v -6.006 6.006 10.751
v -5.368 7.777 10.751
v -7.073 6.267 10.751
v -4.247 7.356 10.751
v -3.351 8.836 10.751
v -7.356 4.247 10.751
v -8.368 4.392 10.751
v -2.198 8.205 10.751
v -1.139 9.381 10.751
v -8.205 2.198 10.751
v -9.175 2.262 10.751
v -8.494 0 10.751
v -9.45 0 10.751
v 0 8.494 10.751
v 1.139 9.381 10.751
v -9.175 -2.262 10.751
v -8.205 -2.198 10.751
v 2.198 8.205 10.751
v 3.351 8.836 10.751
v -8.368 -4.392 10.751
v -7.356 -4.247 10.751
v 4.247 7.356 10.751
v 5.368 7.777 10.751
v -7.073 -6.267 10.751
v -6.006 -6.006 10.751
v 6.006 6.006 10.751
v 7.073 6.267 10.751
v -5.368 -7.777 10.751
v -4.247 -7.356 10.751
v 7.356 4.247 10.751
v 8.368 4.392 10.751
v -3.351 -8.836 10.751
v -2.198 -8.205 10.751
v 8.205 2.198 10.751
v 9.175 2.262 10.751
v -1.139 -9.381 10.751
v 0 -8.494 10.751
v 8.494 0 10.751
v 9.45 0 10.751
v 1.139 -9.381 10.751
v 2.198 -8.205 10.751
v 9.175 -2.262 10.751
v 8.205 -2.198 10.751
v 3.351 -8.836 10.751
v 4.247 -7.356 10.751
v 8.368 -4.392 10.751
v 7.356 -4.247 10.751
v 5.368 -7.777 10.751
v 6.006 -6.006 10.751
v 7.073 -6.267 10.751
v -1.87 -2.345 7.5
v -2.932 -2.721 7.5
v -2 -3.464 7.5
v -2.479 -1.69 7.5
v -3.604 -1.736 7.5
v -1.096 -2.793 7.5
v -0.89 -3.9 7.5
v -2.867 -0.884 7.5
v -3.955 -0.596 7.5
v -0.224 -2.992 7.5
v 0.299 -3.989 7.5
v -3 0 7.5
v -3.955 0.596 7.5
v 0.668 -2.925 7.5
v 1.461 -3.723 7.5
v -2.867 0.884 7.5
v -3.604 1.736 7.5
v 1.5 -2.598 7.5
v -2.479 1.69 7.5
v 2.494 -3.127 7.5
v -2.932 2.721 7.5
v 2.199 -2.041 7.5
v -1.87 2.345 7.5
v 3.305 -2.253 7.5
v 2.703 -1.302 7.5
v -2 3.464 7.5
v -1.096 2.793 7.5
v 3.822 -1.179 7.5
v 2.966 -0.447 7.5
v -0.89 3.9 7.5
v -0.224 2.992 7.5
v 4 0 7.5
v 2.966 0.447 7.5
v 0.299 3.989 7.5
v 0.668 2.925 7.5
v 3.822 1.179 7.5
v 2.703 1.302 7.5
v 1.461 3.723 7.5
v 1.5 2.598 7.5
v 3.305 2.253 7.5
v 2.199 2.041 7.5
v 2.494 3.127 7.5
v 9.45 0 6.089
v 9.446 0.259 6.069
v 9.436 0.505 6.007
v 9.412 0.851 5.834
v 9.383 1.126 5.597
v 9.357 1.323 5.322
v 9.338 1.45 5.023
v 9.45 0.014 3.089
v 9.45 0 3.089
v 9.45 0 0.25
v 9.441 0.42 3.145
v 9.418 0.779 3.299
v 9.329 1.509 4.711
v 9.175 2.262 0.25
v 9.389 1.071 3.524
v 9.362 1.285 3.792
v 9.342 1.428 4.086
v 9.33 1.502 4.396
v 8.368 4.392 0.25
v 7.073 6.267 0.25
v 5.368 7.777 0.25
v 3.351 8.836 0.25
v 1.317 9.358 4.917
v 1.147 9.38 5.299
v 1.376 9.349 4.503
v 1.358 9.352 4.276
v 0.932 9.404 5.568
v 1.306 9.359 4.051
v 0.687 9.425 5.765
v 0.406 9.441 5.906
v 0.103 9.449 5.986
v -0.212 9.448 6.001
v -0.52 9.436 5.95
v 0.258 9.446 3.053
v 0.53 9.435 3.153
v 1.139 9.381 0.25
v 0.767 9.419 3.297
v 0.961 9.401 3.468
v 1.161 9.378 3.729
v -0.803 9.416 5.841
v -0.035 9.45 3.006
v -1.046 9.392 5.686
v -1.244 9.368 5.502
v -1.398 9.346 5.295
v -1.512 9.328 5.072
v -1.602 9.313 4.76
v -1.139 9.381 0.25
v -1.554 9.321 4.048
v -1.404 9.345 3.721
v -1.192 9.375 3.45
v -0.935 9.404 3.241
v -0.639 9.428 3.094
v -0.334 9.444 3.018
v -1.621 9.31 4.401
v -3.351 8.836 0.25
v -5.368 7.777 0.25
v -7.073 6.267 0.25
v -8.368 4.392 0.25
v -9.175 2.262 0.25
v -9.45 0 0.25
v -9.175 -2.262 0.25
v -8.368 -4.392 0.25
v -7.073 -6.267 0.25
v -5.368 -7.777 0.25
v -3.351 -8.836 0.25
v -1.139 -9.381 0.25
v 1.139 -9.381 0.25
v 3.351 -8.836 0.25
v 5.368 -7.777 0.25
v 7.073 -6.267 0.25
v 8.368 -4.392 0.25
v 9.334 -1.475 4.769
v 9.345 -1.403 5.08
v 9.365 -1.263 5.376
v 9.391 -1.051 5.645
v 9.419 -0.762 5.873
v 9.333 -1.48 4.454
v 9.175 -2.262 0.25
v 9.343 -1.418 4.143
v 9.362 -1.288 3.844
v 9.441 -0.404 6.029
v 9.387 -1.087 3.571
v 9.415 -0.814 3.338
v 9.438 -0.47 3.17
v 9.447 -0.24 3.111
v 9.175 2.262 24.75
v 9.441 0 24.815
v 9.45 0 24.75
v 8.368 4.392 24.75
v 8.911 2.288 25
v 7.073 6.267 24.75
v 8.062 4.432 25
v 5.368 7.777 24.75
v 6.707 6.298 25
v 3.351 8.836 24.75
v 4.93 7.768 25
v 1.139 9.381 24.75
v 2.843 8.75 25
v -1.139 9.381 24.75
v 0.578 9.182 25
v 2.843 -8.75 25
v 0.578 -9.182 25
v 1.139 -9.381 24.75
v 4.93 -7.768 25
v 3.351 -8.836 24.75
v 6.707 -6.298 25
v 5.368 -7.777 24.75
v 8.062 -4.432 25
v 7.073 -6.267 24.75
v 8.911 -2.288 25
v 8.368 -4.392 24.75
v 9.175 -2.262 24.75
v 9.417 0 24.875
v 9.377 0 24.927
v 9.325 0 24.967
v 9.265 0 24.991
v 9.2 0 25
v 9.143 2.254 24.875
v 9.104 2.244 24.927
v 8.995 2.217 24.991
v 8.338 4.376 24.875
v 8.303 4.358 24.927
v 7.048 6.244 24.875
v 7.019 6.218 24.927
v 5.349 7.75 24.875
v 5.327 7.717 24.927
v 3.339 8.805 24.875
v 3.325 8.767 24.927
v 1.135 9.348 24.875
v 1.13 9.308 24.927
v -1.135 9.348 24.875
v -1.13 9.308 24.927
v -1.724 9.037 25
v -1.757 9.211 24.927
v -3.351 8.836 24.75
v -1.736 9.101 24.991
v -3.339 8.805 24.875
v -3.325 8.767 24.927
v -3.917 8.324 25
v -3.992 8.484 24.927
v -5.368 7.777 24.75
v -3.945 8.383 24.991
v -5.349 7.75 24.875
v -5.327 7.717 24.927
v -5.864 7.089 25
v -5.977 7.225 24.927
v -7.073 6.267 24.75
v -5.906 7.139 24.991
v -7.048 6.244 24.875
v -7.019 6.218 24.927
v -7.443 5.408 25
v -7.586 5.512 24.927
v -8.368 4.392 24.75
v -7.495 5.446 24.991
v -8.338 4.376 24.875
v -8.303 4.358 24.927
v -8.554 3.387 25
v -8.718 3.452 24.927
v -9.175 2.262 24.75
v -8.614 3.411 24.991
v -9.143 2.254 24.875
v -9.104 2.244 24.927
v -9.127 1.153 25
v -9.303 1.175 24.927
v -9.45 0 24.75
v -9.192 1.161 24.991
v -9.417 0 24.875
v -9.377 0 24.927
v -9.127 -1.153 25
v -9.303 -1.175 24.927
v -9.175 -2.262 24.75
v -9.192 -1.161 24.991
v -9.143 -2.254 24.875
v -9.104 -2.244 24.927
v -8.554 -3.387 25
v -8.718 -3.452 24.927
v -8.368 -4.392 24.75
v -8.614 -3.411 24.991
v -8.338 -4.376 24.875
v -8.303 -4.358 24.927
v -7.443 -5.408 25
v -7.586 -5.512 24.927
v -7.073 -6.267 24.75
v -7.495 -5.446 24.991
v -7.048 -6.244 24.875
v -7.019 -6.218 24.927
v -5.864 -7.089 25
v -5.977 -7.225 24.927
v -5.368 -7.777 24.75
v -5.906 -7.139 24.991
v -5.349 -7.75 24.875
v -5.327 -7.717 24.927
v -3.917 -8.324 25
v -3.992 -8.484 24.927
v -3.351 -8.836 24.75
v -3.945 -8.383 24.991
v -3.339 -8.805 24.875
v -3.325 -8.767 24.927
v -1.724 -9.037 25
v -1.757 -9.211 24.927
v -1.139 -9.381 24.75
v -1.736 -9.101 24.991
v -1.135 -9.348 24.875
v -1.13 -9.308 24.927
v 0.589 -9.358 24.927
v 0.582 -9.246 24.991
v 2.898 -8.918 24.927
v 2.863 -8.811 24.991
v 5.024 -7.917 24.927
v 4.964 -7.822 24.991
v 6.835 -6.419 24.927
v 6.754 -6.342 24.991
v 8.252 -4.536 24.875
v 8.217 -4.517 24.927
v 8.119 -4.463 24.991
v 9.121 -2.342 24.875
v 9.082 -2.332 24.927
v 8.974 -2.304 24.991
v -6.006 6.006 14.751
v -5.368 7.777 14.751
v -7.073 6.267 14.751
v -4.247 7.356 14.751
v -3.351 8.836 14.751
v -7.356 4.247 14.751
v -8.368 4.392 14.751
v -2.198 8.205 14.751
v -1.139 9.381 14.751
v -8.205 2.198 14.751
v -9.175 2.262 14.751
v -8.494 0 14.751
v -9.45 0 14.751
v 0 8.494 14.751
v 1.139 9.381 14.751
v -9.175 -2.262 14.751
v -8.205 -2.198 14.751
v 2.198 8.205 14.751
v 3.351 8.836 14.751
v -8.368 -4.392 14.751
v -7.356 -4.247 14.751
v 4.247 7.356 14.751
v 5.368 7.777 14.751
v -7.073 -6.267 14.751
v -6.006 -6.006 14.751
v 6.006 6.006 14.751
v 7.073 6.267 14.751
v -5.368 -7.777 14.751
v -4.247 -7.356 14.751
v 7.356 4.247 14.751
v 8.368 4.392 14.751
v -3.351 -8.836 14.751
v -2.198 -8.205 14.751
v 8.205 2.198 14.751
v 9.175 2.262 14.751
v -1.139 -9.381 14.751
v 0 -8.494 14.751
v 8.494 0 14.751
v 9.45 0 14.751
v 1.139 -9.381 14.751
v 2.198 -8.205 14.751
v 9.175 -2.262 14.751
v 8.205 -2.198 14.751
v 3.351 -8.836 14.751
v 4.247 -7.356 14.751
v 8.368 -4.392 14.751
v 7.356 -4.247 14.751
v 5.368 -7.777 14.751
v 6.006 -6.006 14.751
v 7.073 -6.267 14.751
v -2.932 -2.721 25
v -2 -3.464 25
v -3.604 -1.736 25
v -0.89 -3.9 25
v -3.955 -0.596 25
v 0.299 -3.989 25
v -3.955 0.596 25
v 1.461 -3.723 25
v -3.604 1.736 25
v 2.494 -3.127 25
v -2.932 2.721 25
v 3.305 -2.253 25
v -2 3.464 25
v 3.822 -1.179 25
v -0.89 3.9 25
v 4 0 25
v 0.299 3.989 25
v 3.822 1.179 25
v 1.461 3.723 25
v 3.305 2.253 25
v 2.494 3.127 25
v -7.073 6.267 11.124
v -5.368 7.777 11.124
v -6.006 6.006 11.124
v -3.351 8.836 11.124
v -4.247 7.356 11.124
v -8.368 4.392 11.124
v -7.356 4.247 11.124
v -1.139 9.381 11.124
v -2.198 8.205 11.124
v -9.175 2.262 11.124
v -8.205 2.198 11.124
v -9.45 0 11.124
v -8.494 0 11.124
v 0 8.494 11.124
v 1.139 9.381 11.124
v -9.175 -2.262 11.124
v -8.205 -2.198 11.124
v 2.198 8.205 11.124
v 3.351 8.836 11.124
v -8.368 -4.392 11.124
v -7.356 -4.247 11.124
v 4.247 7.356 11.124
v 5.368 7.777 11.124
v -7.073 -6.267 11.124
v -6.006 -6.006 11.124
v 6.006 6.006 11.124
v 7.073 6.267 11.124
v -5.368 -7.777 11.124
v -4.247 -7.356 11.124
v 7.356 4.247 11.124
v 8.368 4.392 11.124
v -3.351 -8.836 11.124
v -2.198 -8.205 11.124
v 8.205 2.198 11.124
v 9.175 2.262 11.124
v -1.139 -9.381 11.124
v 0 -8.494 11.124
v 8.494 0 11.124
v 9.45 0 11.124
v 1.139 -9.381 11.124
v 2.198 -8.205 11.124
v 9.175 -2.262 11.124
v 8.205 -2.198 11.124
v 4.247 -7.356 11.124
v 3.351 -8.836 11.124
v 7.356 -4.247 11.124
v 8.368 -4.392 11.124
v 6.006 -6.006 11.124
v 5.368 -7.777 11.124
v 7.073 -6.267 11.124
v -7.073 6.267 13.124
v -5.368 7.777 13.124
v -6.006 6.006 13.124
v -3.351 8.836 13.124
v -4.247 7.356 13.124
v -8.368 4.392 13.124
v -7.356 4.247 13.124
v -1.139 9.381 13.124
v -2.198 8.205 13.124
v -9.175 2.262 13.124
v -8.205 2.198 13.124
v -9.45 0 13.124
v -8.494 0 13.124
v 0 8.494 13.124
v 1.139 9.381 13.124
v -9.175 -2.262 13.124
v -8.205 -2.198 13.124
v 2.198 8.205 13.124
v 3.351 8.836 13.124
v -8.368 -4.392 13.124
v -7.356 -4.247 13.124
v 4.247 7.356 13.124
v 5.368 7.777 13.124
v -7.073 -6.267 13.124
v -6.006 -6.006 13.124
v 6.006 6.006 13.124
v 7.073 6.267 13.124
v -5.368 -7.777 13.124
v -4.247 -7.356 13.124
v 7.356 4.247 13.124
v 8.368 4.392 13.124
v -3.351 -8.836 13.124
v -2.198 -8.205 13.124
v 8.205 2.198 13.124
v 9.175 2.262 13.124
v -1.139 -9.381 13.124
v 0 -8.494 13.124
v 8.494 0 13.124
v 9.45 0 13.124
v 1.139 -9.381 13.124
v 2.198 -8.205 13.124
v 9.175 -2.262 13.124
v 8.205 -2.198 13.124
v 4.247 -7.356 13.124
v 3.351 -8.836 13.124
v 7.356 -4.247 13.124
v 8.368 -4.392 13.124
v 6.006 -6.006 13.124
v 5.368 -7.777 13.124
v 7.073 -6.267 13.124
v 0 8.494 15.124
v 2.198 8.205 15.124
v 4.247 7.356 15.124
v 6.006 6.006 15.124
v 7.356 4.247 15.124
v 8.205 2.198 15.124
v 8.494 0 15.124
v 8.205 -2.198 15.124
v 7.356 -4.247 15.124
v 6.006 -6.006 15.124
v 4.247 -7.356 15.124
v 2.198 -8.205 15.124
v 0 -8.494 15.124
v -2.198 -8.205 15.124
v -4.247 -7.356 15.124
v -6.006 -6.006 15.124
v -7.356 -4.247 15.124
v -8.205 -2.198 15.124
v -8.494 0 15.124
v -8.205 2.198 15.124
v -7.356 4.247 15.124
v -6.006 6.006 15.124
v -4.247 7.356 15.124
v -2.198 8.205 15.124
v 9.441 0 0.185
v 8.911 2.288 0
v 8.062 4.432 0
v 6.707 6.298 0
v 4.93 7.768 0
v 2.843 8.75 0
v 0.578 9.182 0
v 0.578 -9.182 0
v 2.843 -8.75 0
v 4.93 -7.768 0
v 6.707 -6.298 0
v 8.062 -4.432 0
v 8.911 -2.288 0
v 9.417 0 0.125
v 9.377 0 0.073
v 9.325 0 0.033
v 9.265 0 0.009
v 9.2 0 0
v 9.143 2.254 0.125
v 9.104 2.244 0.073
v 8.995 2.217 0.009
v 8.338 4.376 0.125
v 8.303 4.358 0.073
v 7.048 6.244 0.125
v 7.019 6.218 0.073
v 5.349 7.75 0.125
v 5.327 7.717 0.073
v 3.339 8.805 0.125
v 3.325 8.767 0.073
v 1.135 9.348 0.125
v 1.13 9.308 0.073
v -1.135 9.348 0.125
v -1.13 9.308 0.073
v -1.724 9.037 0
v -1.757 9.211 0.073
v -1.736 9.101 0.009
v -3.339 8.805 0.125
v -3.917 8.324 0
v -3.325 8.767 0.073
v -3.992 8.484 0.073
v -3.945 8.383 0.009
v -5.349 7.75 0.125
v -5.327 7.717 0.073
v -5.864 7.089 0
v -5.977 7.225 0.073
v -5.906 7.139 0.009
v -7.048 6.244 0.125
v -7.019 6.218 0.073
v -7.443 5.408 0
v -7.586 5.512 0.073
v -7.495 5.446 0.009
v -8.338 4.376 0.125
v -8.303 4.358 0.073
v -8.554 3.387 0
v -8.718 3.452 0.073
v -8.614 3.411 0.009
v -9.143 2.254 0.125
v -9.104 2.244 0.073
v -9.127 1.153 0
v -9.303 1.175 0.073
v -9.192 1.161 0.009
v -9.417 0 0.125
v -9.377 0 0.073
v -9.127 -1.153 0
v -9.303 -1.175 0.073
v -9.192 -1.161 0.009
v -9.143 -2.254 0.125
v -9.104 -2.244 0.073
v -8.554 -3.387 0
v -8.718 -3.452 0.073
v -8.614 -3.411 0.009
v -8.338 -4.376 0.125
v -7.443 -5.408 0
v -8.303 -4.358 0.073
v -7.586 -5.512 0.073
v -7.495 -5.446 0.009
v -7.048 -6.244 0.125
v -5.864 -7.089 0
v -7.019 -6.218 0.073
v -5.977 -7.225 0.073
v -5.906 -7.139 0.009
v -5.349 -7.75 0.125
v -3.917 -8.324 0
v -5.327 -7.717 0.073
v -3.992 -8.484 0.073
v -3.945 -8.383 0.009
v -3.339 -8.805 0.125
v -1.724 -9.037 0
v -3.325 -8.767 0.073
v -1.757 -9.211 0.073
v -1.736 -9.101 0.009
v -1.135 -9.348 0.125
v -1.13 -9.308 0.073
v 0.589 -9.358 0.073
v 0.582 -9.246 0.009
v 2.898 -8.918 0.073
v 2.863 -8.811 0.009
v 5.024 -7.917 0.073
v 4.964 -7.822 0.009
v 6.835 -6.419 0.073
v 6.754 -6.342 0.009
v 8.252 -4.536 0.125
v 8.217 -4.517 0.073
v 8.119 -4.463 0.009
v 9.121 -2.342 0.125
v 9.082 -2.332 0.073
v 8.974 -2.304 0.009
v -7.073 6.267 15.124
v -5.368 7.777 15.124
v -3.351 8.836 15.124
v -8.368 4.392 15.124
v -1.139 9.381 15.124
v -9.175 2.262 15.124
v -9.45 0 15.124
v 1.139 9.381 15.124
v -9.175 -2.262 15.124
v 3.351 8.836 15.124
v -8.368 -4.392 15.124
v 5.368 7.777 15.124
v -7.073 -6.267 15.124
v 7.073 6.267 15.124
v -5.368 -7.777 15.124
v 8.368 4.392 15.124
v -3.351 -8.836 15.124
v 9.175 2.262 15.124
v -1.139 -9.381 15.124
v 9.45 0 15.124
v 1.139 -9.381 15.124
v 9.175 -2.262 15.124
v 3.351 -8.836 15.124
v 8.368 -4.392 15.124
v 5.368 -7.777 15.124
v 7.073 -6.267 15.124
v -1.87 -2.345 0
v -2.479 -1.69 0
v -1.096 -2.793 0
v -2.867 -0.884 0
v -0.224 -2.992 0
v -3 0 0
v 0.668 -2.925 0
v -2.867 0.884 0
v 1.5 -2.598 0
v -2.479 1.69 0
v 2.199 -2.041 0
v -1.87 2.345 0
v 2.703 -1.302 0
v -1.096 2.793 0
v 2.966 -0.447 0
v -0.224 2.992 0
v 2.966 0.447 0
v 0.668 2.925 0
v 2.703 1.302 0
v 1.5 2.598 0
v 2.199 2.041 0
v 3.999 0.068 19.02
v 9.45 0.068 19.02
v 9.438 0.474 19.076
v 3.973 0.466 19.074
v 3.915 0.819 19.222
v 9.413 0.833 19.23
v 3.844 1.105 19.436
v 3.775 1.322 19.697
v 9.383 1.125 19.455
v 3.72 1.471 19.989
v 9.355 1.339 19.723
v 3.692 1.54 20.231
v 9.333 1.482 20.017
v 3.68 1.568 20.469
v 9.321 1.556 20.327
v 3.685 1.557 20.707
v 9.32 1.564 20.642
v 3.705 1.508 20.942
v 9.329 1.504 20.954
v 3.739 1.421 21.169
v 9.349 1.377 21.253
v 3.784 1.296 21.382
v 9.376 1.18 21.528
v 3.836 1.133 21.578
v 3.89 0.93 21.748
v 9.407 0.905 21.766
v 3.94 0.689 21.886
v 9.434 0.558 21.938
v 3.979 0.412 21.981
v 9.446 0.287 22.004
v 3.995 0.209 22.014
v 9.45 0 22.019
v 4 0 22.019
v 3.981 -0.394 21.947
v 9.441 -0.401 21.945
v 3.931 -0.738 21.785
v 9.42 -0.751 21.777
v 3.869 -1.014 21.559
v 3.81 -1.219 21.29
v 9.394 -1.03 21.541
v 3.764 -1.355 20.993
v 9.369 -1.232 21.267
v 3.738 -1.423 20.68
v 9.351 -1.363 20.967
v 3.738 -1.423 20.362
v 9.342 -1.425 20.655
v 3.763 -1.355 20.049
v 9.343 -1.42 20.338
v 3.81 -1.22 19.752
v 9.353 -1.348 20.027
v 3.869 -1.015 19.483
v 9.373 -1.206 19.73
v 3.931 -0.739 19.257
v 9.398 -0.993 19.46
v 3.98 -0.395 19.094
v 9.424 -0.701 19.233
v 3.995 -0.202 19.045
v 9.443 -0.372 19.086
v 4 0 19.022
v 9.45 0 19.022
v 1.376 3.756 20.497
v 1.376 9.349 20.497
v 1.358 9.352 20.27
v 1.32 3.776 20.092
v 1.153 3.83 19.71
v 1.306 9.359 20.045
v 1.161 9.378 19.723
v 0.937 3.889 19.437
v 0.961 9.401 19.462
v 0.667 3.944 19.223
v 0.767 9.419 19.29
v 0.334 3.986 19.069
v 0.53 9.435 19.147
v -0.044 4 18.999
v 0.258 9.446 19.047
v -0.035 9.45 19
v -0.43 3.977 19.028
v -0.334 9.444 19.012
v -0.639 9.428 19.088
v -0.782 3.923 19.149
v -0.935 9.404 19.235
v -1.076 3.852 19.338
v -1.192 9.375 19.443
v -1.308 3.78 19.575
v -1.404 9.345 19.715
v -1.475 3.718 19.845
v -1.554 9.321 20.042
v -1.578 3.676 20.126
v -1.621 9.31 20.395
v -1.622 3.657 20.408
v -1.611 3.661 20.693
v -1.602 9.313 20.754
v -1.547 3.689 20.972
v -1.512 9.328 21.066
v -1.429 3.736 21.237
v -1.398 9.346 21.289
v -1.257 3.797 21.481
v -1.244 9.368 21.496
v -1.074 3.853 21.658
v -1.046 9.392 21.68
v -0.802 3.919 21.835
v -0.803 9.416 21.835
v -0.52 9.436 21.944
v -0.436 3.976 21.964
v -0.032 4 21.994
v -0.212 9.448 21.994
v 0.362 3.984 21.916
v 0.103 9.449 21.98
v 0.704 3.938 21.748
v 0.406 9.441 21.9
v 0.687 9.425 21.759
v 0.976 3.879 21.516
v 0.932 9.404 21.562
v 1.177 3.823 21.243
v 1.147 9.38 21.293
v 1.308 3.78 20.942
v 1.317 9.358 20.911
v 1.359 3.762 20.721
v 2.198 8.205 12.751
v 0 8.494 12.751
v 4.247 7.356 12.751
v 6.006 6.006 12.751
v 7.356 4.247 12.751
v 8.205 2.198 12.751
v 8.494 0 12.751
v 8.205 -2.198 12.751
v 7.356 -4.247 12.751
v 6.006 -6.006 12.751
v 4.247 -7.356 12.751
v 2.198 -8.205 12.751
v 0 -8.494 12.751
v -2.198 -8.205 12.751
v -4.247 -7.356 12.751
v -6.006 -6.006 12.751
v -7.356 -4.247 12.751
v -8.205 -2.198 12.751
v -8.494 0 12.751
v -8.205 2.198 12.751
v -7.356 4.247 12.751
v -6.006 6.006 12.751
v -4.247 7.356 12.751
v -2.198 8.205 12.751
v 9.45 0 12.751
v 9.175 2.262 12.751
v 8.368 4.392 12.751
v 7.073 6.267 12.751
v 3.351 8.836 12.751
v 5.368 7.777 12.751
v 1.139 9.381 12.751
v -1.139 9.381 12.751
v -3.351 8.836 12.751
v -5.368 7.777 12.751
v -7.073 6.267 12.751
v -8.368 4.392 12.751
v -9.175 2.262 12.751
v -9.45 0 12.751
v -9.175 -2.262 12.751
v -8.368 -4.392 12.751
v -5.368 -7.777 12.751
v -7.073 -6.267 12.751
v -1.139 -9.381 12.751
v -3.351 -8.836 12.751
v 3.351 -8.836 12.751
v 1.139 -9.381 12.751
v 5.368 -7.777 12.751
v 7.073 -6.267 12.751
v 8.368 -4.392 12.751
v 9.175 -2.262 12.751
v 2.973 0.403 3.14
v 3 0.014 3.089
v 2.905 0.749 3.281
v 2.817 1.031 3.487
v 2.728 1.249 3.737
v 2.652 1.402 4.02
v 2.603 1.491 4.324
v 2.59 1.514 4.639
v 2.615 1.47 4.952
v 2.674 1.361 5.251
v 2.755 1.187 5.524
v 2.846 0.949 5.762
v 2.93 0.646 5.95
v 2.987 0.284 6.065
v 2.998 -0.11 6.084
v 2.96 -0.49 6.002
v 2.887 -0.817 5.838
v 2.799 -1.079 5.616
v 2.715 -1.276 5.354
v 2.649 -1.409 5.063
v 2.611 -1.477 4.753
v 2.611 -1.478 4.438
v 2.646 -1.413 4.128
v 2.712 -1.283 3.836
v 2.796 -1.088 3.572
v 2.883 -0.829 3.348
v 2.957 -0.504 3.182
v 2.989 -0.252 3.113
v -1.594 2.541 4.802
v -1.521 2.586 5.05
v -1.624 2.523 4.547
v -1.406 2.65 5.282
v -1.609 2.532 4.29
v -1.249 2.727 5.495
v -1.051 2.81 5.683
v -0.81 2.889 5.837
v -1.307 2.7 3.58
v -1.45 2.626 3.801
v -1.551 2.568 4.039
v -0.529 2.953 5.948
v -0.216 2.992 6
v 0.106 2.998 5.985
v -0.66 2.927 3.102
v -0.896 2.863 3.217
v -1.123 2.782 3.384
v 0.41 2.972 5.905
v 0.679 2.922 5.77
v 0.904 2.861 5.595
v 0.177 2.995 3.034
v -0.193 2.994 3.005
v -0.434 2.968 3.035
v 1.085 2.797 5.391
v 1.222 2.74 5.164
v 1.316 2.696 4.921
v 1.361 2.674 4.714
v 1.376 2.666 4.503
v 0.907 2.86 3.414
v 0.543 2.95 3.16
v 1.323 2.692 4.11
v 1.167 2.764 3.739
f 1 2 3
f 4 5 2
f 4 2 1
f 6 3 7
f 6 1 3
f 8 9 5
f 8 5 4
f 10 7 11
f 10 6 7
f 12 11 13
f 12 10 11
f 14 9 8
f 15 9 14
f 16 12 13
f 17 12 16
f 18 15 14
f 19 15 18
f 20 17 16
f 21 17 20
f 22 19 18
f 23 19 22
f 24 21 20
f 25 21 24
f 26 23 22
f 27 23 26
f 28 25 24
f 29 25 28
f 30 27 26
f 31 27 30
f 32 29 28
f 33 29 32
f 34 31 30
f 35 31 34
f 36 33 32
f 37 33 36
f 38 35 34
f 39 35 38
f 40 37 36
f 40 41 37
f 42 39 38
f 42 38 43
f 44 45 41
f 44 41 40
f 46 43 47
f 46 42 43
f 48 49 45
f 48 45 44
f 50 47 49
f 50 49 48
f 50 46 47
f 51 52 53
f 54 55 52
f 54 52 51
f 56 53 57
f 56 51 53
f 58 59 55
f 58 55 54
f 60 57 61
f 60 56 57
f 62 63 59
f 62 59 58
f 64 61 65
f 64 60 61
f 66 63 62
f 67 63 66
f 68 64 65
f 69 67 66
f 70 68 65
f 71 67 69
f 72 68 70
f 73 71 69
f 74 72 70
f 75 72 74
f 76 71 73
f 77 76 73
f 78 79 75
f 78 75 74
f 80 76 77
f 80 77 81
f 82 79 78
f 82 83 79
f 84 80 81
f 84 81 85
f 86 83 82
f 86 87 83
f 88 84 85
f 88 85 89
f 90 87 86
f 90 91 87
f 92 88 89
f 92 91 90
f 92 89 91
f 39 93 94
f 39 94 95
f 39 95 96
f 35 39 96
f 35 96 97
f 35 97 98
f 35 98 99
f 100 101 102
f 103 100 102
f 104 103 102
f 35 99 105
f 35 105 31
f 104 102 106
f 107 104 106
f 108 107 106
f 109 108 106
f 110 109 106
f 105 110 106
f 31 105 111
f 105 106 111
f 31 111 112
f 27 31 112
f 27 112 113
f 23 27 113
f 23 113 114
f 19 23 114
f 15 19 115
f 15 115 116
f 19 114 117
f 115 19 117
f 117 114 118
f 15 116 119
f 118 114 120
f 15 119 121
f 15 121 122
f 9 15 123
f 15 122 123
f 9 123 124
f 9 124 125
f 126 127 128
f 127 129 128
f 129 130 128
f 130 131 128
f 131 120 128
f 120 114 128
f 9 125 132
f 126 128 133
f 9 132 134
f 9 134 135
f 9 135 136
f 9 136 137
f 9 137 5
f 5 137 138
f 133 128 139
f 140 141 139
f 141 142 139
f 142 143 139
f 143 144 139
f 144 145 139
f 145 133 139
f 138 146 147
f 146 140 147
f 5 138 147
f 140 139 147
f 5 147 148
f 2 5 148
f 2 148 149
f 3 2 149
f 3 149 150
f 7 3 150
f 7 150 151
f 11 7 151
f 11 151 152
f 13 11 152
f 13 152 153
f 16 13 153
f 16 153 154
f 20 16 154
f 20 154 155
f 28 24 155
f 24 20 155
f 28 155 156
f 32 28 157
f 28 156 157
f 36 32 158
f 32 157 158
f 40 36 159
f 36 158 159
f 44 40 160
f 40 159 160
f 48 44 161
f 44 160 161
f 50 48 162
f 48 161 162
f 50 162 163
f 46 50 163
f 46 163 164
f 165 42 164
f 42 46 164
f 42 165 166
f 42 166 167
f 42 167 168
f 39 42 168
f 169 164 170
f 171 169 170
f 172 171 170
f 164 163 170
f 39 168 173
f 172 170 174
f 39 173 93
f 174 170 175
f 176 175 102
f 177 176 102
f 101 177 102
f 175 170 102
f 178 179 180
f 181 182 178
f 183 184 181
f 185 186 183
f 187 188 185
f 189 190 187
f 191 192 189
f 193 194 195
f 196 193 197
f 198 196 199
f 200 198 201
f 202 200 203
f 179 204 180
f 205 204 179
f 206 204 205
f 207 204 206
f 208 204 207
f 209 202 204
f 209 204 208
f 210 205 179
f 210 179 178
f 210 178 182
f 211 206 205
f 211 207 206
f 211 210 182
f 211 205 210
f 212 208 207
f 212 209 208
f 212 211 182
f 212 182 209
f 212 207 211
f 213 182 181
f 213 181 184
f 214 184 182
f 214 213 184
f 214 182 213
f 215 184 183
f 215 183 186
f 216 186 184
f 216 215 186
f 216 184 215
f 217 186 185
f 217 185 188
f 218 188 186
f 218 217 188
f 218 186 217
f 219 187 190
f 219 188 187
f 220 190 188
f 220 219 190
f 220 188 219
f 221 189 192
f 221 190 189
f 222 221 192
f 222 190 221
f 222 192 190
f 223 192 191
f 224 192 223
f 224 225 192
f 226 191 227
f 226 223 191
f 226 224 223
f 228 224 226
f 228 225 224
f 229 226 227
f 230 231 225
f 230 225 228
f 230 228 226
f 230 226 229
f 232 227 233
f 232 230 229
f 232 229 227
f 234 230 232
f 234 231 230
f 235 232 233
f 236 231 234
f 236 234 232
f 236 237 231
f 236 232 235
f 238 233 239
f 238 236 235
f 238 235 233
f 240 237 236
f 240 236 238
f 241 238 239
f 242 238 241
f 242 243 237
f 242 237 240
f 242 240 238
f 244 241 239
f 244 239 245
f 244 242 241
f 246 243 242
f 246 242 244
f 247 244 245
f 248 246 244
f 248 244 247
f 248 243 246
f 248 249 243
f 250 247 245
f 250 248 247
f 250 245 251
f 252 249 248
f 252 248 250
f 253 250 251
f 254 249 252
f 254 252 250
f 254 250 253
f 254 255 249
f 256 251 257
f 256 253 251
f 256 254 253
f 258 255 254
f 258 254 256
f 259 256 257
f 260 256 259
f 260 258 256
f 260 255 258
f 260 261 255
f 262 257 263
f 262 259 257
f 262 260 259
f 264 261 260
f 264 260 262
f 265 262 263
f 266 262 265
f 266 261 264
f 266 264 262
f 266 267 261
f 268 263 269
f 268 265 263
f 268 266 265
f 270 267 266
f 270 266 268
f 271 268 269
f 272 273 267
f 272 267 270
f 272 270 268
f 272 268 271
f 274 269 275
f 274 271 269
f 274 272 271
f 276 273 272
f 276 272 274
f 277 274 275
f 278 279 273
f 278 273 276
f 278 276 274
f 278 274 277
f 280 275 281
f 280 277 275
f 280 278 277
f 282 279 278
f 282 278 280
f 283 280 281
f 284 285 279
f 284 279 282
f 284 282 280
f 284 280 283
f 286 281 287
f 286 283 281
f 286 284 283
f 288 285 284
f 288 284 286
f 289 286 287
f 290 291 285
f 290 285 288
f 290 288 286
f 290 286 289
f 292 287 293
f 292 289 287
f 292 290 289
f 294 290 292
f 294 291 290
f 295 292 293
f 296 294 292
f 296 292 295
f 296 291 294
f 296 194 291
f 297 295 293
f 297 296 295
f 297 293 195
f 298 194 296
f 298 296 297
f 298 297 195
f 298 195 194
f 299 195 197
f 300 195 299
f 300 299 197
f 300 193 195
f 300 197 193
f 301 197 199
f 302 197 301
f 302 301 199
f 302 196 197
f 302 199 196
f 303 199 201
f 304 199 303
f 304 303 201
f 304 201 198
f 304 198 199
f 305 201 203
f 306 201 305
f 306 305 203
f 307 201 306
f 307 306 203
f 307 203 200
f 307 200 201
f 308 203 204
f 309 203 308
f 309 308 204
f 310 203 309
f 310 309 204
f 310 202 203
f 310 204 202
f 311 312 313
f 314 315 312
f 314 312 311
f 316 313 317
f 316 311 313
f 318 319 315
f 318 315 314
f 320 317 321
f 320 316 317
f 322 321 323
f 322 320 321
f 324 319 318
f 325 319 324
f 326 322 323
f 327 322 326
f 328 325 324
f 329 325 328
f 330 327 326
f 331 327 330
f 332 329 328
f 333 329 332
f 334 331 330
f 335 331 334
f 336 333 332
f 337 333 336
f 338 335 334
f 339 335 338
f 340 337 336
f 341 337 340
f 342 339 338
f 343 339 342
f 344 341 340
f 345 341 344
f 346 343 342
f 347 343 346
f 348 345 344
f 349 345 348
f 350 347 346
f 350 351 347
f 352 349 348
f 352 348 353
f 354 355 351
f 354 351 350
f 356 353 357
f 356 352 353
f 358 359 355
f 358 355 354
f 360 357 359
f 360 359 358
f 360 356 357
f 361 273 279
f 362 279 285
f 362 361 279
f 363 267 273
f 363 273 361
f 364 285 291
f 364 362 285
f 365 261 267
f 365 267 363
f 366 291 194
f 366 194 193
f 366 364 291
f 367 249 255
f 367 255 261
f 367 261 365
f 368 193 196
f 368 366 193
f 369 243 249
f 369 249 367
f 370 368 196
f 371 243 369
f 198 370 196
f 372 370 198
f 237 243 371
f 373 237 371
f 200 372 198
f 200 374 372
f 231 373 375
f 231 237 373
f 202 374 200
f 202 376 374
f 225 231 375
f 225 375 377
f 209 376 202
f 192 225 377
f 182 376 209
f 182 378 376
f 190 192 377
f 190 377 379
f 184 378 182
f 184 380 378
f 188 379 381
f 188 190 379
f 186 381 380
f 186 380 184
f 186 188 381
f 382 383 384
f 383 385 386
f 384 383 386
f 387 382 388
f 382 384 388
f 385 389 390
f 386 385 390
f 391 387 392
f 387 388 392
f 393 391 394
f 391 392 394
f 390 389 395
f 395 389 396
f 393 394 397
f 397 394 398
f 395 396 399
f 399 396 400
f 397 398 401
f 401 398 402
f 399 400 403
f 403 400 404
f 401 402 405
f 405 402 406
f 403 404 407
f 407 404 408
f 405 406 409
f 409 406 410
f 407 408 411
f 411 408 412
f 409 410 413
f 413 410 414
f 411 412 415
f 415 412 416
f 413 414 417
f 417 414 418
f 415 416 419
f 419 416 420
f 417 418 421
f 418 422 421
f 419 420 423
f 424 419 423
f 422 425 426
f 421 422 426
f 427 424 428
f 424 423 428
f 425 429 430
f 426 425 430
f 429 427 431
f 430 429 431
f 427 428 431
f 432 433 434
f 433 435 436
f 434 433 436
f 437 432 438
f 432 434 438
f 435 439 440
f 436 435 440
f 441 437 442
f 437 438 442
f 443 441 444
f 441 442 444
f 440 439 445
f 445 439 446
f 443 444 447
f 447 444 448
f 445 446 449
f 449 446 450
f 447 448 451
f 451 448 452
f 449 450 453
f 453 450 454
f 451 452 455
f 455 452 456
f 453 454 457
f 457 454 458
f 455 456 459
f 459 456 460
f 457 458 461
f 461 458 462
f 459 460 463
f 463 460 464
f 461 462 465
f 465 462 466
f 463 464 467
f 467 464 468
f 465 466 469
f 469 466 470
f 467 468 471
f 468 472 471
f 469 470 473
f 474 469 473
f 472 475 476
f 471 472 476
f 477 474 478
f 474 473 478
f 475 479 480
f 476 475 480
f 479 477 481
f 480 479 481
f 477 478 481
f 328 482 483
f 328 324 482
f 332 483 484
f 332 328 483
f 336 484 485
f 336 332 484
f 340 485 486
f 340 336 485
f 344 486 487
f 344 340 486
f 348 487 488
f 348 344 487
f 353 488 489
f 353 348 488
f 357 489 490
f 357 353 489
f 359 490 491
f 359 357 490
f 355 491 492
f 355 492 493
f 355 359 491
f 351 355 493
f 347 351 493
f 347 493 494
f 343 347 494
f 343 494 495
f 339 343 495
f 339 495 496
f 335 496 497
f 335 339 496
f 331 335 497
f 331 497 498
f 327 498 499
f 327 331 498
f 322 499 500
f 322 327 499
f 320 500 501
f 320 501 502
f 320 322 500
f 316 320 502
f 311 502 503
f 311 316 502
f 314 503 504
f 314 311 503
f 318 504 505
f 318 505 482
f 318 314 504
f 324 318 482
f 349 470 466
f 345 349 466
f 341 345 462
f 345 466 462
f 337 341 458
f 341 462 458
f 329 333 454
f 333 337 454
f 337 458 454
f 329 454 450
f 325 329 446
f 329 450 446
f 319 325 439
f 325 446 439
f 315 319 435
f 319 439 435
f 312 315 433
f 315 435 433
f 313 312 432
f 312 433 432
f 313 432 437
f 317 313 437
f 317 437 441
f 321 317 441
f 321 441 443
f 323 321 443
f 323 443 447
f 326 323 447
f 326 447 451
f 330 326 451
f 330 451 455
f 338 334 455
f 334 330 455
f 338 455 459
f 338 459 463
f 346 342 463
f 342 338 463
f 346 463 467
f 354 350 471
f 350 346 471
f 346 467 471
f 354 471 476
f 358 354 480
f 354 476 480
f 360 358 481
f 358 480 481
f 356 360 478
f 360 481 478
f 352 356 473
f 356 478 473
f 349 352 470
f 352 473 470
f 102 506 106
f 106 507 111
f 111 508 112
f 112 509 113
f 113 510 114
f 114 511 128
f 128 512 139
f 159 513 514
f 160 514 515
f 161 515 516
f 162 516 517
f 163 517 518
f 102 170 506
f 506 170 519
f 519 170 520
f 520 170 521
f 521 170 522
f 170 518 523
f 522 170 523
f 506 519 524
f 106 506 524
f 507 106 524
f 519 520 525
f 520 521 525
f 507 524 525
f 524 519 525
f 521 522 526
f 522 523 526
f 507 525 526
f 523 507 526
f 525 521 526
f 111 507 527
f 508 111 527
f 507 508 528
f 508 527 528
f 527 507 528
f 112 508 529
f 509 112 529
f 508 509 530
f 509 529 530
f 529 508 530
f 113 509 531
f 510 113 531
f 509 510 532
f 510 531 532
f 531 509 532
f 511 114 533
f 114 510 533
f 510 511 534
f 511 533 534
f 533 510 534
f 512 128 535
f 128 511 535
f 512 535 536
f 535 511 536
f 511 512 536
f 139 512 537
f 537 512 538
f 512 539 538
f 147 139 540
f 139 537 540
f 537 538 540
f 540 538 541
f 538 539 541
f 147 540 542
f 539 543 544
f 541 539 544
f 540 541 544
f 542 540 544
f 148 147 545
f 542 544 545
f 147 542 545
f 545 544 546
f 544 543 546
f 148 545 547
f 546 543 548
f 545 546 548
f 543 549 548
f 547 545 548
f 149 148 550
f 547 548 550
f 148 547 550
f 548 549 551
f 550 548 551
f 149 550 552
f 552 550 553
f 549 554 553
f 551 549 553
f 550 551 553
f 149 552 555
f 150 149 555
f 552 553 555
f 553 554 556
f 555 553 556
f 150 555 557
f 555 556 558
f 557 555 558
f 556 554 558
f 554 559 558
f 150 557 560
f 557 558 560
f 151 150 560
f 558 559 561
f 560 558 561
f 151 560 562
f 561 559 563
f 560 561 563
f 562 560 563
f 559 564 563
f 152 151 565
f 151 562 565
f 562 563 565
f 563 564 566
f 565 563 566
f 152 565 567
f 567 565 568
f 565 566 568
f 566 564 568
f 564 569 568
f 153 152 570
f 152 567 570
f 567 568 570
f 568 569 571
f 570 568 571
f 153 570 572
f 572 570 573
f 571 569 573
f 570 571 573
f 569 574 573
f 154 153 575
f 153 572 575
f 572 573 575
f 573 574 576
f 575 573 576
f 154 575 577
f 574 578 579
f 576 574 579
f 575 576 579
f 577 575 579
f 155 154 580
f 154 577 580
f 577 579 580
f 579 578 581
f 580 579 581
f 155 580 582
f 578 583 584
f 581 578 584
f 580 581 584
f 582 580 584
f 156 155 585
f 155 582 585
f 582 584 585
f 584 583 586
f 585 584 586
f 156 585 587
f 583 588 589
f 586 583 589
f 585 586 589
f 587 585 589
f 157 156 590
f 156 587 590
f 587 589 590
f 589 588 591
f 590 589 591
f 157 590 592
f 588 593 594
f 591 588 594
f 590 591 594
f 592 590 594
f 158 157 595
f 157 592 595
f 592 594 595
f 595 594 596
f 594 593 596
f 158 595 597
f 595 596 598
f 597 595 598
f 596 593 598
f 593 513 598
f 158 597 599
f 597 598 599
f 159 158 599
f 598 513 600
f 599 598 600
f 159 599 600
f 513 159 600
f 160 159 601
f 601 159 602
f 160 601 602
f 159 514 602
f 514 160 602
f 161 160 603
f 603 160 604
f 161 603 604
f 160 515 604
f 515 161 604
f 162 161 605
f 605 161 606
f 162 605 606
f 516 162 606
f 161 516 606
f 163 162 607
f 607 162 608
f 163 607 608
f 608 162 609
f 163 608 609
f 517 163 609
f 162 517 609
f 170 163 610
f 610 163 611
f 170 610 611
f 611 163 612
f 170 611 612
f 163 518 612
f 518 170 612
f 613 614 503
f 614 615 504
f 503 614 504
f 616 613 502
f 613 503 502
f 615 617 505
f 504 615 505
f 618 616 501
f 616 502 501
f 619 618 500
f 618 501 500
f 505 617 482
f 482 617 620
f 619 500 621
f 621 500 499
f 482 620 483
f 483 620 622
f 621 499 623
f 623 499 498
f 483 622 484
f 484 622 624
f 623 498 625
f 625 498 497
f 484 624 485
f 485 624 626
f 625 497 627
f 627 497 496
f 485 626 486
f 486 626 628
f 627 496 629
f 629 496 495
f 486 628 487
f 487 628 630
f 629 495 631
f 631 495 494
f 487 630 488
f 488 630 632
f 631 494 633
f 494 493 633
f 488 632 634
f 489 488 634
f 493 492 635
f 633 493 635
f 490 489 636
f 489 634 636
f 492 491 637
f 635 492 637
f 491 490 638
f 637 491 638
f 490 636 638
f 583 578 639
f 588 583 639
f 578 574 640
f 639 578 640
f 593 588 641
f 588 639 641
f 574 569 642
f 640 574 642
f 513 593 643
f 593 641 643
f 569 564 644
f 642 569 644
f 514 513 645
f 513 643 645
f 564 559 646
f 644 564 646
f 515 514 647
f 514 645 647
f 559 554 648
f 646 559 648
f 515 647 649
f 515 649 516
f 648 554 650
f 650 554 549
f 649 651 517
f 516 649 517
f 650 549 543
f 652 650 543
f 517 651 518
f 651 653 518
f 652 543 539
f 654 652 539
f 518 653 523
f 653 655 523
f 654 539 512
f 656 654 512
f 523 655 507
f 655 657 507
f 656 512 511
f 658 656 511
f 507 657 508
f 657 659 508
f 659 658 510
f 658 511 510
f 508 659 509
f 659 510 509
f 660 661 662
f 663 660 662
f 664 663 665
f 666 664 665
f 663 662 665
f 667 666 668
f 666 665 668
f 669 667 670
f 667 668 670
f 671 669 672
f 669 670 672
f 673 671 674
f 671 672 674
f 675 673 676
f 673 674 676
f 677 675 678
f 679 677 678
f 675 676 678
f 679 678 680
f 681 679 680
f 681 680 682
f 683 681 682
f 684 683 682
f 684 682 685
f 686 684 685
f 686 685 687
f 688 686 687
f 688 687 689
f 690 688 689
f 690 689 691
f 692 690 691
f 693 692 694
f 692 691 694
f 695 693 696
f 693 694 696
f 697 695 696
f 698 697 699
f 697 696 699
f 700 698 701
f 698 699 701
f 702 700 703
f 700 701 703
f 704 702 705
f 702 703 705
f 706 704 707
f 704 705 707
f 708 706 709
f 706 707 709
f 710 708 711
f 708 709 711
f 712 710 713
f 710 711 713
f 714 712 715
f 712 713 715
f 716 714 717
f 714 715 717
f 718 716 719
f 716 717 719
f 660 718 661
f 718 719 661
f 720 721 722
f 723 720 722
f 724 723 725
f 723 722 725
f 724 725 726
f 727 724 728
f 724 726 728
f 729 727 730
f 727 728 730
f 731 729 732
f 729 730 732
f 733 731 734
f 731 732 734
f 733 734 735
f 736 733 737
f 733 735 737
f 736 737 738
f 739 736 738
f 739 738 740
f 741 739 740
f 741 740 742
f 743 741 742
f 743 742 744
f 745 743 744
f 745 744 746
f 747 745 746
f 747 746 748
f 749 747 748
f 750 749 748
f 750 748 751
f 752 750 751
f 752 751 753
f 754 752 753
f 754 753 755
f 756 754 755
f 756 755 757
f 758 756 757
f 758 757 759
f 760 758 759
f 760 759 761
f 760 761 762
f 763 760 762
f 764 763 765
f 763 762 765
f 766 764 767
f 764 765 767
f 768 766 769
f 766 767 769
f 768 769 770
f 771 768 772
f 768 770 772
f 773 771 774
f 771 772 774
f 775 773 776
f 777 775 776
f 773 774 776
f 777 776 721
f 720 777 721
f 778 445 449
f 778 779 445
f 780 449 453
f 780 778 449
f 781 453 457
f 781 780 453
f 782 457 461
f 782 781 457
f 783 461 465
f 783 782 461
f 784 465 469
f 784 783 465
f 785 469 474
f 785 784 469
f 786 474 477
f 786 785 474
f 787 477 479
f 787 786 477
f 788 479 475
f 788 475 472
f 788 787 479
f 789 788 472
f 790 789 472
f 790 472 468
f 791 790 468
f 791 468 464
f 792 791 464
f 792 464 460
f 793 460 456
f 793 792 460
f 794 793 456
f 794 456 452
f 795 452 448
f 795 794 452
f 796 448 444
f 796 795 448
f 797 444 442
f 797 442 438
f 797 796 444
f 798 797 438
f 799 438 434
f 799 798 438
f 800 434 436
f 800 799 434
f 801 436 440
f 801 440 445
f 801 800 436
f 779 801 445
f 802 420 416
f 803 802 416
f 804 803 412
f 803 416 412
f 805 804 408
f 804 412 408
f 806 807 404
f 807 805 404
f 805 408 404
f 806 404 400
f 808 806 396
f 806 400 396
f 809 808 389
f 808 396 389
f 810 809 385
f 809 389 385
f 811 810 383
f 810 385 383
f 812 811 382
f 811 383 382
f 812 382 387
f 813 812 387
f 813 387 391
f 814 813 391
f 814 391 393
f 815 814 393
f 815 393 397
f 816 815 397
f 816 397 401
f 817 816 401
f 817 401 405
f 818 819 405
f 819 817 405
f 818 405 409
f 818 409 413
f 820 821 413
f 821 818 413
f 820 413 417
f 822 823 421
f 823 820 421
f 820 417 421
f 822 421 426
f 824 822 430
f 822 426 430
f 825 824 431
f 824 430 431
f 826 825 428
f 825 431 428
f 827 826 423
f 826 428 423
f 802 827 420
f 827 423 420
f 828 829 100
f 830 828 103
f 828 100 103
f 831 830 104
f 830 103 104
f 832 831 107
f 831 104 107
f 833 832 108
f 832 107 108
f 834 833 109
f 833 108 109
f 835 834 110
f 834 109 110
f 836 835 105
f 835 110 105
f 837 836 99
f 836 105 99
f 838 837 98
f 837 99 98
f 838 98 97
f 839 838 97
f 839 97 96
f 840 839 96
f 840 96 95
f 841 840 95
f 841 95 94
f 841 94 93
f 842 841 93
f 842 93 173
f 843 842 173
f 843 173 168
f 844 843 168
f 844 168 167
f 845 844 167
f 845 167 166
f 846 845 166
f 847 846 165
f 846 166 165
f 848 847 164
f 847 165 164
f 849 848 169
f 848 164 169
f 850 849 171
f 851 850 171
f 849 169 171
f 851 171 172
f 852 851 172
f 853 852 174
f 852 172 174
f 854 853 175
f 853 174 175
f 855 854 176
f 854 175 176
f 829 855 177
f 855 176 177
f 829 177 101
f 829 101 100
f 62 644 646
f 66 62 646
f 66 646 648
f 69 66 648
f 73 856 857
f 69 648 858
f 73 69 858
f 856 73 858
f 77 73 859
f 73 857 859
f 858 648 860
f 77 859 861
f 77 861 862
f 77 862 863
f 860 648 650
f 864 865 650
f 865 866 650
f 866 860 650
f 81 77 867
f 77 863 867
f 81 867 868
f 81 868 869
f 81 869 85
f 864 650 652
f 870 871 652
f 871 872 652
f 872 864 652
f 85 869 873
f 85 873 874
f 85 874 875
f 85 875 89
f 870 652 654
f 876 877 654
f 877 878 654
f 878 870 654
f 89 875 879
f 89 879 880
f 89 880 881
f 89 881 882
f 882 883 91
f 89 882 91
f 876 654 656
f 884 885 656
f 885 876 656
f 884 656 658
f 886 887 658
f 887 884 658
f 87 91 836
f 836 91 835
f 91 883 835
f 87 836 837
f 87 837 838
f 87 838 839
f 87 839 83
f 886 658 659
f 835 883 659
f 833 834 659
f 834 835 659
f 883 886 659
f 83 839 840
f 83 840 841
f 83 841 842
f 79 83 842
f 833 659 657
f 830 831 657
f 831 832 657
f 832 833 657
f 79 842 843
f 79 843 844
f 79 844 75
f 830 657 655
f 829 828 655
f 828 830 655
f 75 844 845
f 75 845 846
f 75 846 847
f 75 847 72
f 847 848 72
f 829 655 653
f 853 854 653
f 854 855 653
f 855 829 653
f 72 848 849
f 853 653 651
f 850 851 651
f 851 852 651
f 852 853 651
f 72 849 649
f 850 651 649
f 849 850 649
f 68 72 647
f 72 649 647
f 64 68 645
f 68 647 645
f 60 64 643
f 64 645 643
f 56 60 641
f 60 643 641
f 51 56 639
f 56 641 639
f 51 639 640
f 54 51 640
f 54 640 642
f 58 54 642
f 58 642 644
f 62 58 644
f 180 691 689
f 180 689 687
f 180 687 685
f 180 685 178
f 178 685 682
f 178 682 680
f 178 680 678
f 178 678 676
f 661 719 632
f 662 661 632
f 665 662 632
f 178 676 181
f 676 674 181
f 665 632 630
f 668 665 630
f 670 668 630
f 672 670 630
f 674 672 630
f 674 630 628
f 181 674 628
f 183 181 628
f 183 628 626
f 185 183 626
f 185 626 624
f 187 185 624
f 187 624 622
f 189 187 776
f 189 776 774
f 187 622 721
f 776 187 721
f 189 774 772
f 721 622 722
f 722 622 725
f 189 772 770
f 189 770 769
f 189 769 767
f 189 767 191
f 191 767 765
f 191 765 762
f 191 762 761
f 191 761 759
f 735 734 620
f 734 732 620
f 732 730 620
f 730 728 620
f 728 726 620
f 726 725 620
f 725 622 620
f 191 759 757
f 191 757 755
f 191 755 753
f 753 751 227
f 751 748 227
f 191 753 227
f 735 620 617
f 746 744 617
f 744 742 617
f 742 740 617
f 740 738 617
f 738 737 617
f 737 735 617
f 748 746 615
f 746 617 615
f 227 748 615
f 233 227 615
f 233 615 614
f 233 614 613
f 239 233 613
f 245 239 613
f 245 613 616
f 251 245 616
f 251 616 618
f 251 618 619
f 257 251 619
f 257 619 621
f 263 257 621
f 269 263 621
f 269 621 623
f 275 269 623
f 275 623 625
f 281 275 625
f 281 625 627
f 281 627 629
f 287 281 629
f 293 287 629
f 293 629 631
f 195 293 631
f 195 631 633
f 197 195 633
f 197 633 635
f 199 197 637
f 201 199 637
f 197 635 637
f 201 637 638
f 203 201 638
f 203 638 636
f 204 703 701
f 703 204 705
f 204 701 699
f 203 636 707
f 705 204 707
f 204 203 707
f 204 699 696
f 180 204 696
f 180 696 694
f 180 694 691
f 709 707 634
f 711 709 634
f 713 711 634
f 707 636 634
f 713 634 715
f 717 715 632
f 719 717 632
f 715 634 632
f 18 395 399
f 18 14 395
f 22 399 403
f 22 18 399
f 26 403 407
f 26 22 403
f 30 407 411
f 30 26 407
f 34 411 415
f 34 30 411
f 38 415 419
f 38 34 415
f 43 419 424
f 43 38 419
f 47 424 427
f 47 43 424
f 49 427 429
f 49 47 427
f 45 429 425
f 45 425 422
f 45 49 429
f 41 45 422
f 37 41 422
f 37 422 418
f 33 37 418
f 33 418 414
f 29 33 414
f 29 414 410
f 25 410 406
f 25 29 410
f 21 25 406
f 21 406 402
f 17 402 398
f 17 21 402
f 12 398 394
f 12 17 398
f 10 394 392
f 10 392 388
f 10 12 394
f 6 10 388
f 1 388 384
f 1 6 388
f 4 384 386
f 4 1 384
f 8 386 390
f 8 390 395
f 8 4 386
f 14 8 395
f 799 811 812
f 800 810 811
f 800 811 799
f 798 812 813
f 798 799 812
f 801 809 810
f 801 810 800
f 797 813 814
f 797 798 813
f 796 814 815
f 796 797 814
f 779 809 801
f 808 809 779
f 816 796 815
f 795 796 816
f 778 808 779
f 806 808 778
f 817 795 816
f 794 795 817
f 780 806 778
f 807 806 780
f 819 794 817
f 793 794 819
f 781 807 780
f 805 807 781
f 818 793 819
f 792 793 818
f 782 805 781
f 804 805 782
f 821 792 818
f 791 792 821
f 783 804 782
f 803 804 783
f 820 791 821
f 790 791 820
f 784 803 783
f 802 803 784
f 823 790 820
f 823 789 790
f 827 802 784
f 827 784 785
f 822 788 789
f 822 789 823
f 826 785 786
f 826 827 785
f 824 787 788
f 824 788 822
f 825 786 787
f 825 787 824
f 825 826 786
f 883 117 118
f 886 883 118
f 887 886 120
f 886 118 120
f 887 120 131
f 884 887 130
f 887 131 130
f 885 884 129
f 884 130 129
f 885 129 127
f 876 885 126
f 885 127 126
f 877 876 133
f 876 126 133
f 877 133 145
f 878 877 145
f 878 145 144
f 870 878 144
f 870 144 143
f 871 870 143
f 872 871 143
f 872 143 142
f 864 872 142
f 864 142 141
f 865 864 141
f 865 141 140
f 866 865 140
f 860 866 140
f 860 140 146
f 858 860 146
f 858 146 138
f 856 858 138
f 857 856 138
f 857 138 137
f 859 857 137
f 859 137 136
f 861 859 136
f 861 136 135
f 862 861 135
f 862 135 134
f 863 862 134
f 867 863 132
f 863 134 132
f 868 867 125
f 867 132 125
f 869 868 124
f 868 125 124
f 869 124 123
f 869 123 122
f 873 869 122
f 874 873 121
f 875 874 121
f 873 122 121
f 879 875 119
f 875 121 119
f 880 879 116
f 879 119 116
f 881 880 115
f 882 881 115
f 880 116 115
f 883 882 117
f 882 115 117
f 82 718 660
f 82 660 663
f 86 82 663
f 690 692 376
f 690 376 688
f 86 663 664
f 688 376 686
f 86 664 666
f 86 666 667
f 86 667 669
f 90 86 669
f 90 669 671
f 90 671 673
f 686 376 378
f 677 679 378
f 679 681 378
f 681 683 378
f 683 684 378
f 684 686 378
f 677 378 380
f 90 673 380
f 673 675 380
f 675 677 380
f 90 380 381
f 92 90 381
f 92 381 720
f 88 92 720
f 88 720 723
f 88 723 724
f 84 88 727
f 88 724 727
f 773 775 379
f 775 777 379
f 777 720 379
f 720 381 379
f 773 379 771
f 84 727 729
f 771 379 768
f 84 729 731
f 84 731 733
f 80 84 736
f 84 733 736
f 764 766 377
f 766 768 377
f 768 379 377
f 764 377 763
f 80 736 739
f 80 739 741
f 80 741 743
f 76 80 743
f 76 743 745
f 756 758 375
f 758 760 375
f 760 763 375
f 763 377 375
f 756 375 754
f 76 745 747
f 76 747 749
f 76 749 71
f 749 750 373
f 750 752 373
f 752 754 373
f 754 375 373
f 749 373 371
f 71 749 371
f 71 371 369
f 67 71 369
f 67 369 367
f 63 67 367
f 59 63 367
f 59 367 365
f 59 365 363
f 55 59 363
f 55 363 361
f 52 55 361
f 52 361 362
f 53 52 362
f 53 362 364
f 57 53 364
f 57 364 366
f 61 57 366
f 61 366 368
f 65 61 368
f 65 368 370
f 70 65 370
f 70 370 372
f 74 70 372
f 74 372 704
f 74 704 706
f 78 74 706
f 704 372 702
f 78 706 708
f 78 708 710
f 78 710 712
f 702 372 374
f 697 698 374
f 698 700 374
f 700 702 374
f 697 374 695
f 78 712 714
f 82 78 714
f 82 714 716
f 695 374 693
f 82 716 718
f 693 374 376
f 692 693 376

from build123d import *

# Parameters (mm, degrees)
ESQUISSE1_R             = 9.45
BOSS_EXTRU_1_DEPTH      = 25
CONG_1_R                = 0.25
ESQUISSE2_R             = 4
ENL_V_MAT_EXTRU_1_DEPTH = 17.5
ESQUISSE3_R             = 3
ENL_V_MAT_EXTRU_2_DEPTH = 17.5
ESQUISSE4_R             = 1.5
ENL_V_MAT_EXTRU_3_DEPTH = 10
ESQUISSE5_R             = 1.5
ENL_V_MAT_EXTRU_4_DEPTH = 10
ESQUISSE7_W             = 0.372914415
ESQUISSE7_H             = 1.339729566


with BuildPart() as part:
    # Esquisse1 → Boss.-Extru.1 (new body)
    with BuildSketch(Plane.XY):
        Circle(ESQUISSE1_R)
    extrude(amount=BOSS_EXTRU_1_DEPTH)

    # Congé1
    cong_1_edges = [part.edges().sort_by_distance(p)[0] for p in [
        (-9.45, 0, 0),
        (-9.45, 0, 25),
    ]]
    fillet(cong_1_edges, radius=CONG_1_R)

    # Esquisse2 → Enlèv. mat.-Extru.1 (cut)
    with BuildSketch(Plane.XY.offset(25)):
        Circle(ESQUISSE2_R)
    extrude(amount=-ENL_V_MAT_EXTRU_1_DEPTH, mode=Mode.SUBTRACT)

    # Esquisse3 → Enlèv. mat.-Extru.2 (cut)
    with BuildSketch(Plane(origin=(0, 0, 0), x_dir=(-1, 0, 0), z_dir=(0, 0, -1))):
        Circle(ESQUISSE3_R)
    extrude(amount=-ENL_V_MAT_EXTRU_2_DEPTH, mode=Mode.SUBTRACT)

    # Esquisse4 → Enlèv. mat.-Extru.3 (cut)
    with BuildSketch(Plane(origin=(9.45, 0, 0), x_dir=(0, 0, -1), z_dir=(1, 0, 0))):
        with Locations((-4.589130857, 0.014370537)):
            Circle(ESQUISSE4_R)
        with Locations((-20.520433185, 0.068499333)):
            Circle(ESQUISSE4_R)
    extrude(amount=-ENL_V_MAT_EXTRU_3_DEPTH, mode=Mode.SUBTRACT)

    # Esquisse5 → Enlèv. mat.-Extru.4 (cut)
    with BuildSketch(Plane(origin=(0, 9.45, 0), x_dir=(1, 0, 0), z_dir=(0, 1, 0))):
        with Locations((-0.124304805, -20.496942457)):
            Circle(ESQUISSE5_R)
        with Locations((-0.124304805, -4.503057543)):
            Circle(ESQUISSE5_R)
    extrude(amount=-ENL_V_MAT_EXTRU_4_DEPTH, mode=Mode.SUBTRACT)

    # Esquisse7 → Enlèvement de matière-Révolution1 (revolve, cut)
    with BuildSketch(Plane(origin=(0, 0, 0), x_dir=(0, 0, -1), z_dir=(1, 0, 0))):
        with Locations((-12.937755344, 9.16402646)):
            Rectangle(ESQUISSE7_W, ESQUISSE7_H)
        with Locations((-14.937755344, 9.16402646)):
            Rectangle(ESQUISSE7_W, ESQUISSE7_H)
        with Locations((-10.937755344, 9.16402646)):
            Rectangle(ESQUISSE7_W, ESQUISSE7_H)
    revolve(axis=Axis((0, 0, 25), (0, 0, -1)), mode=Mode.SUBTRACT)


solid = part.part
